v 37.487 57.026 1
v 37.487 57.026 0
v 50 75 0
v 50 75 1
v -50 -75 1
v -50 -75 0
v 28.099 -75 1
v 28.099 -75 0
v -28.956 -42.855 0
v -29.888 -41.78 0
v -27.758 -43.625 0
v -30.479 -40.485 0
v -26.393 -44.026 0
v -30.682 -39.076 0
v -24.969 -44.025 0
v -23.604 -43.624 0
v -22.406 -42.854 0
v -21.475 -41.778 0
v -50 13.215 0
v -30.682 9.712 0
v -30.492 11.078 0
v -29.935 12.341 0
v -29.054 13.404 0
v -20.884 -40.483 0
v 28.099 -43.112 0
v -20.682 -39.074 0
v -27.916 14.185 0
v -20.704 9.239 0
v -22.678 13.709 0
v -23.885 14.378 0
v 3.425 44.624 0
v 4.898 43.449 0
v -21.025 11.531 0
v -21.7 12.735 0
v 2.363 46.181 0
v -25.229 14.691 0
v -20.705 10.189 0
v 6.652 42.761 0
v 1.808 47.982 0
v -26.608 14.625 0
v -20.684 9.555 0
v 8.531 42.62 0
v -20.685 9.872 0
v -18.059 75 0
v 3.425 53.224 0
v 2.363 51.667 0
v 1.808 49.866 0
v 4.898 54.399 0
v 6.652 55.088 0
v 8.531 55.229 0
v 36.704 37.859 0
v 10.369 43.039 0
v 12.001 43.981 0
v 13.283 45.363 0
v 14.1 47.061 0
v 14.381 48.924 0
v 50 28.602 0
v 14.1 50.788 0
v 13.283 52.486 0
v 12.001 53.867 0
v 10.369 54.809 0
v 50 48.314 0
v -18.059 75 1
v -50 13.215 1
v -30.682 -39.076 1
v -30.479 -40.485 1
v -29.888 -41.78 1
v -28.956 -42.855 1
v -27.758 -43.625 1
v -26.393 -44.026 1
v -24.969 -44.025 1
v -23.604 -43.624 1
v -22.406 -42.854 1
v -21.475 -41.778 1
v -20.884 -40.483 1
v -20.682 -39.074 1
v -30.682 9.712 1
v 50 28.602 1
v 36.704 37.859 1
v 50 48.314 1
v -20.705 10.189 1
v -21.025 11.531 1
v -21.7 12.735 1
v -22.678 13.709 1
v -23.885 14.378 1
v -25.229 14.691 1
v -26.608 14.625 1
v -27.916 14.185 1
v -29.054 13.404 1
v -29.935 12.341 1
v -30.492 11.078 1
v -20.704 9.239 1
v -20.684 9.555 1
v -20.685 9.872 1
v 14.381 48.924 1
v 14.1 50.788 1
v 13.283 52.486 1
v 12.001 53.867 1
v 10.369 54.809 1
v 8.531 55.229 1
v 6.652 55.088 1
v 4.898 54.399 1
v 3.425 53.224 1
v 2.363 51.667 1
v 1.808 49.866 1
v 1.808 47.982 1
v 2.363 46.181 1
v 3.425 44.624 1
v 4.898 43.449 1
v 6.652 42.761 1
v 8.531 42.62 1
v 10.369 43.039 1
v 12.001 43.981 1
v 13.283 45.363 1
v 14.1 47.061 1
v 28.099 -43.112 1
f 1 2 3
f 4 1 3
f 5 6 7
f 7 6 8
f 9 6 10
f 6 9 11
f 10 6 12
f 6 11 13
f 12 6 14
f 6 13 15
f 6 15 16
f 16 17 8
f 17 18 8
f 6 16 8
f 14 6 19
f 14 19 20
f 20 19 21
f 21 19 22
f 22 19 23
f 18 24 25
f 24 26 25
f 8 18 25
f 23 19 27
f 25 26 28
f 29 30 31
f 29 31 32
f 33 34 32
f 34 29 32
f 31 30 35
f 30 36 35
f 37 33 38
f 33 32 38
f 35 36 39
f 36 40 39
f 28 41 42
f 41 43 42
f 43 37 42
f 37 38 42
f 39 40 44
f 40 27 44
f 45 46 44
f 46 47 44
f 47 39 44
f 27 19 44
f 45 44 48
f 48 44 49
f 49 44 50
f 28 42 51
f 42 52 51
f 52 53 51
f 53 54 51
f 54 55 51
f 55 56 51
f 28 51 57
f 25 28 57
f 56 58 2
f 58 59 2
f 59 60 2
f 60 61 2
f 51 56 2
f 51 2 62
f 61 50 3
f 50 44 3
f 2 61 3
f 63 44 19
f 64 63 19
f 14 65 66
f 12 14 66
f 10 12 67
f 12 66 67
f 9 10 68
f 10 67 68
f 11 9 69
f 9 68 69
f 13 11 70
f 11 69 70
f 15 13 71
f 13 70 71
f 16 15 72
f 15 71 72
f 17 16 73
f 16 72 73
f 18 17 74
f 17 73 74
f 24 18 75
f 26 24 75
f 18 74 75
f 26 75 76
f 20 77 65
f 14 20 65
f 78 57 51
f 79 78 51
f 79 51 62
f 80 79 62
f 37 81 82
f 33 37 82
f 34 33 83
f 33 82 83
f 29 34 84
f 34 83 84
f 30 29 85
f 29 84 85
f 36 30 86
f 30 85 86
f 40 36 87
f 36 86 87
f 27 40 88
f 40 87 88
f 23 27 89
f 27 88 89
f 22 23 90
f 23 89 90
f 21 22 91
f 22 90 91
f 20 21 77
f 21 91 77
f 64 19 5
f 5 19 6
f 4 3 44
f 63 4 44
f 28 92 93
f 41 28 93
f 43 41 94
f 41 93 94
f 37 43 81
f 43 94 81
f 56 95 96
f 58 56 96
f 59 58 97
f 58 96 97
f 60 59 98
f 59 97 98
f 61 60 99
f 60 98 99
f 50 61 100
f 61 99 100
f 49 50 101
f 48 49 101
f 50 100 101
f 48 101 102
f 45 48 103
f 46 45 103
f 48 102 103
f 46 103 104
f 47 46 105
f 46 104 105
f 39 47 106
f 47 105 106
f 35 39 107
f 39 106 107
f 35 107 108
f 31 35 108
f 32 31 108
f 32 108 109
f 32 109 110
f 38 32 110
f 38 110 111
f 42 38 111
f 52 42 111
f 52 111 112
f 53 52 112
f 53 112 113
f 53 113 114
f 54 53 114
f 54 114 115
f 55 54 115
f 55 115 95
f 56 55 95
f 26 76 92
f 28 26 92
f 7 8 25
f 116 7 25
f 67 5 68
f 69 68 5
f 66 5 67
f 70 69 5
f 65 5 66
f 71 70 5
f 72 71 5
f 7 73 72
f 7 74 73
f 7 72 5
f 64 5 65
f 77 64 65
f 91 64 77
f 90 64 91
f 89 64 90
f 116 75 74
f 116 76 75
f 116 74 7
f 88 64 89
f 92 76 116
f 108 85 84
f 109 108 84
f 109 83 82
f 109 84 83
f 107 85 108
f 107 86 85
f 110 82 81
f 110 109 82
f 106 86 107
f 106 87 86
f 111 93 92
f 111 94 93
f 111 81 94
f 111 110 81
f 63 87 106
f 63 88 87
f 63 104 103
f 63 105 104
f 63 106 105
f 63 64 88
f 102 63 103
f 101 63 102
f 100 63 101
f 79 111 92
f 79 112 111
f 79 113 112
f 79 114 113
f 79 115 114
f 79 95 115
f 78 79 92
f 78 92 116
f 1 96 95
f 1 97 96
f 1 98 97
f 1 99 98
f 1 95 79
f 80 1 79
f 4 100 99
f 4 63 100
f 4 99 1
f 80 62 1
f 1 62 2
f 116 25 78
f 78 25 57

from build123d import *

# Parameters (mm, degrees)
F1_DEPTH = 1
F2_R     = 6.322095
F3_DEPTH = 25


with BuildPart() as f1:
    # F0 (on Top) → F1 (new body)
    with BuildSketch(Plane.XY):
        Polygon((50, 75), (-18.058607, 75), (-50, 13.215269), (-50, -75), (28.098688, -75), (28.098688, -43.112274), (50, 28.602385), (36.704283, 37.858568), (50, 48.314037), (37.486609, 57.025582), align=None)
    extrude(amount=F1_DEPTH)

    # F2 (on face) → F3 (cut)
    with BuildSketch(Plane.XY.offset(1)):
        with Locations((8.059037, 48.924173)):
            Circle(F2_R)
        with BuildLine():
            Line((-20.704884, 10.188761), (-20.704444, 9.23894))
            ThreePointArc((-20.704444, 9.23894), (-20.682059, 9.713861), (-20.704884, 10.188761))
        make_face()
        with BuildLine():
            Line((-20.682059, -39.073944), (-20.704444, 9.23894))
            Line((-20.704444, 9.23894), (-20.704884, 10.188761))
            ThreePointArc((-20.704884, 10.188761), (-25.920939, 14.705834), (-30.682058, 9.711544))
            Line((-30.682058, 9.711544), (-30.682058, -39.076261))
            ThreePointArc((-30.682058, -39.076261), (-25.6809, -44.076261), (-20.682059, -39.073944))
        make_face()
    extrude(amount=-F3_DEPTH, mode=Mode.SUBTRACT)


solid = f1.part
